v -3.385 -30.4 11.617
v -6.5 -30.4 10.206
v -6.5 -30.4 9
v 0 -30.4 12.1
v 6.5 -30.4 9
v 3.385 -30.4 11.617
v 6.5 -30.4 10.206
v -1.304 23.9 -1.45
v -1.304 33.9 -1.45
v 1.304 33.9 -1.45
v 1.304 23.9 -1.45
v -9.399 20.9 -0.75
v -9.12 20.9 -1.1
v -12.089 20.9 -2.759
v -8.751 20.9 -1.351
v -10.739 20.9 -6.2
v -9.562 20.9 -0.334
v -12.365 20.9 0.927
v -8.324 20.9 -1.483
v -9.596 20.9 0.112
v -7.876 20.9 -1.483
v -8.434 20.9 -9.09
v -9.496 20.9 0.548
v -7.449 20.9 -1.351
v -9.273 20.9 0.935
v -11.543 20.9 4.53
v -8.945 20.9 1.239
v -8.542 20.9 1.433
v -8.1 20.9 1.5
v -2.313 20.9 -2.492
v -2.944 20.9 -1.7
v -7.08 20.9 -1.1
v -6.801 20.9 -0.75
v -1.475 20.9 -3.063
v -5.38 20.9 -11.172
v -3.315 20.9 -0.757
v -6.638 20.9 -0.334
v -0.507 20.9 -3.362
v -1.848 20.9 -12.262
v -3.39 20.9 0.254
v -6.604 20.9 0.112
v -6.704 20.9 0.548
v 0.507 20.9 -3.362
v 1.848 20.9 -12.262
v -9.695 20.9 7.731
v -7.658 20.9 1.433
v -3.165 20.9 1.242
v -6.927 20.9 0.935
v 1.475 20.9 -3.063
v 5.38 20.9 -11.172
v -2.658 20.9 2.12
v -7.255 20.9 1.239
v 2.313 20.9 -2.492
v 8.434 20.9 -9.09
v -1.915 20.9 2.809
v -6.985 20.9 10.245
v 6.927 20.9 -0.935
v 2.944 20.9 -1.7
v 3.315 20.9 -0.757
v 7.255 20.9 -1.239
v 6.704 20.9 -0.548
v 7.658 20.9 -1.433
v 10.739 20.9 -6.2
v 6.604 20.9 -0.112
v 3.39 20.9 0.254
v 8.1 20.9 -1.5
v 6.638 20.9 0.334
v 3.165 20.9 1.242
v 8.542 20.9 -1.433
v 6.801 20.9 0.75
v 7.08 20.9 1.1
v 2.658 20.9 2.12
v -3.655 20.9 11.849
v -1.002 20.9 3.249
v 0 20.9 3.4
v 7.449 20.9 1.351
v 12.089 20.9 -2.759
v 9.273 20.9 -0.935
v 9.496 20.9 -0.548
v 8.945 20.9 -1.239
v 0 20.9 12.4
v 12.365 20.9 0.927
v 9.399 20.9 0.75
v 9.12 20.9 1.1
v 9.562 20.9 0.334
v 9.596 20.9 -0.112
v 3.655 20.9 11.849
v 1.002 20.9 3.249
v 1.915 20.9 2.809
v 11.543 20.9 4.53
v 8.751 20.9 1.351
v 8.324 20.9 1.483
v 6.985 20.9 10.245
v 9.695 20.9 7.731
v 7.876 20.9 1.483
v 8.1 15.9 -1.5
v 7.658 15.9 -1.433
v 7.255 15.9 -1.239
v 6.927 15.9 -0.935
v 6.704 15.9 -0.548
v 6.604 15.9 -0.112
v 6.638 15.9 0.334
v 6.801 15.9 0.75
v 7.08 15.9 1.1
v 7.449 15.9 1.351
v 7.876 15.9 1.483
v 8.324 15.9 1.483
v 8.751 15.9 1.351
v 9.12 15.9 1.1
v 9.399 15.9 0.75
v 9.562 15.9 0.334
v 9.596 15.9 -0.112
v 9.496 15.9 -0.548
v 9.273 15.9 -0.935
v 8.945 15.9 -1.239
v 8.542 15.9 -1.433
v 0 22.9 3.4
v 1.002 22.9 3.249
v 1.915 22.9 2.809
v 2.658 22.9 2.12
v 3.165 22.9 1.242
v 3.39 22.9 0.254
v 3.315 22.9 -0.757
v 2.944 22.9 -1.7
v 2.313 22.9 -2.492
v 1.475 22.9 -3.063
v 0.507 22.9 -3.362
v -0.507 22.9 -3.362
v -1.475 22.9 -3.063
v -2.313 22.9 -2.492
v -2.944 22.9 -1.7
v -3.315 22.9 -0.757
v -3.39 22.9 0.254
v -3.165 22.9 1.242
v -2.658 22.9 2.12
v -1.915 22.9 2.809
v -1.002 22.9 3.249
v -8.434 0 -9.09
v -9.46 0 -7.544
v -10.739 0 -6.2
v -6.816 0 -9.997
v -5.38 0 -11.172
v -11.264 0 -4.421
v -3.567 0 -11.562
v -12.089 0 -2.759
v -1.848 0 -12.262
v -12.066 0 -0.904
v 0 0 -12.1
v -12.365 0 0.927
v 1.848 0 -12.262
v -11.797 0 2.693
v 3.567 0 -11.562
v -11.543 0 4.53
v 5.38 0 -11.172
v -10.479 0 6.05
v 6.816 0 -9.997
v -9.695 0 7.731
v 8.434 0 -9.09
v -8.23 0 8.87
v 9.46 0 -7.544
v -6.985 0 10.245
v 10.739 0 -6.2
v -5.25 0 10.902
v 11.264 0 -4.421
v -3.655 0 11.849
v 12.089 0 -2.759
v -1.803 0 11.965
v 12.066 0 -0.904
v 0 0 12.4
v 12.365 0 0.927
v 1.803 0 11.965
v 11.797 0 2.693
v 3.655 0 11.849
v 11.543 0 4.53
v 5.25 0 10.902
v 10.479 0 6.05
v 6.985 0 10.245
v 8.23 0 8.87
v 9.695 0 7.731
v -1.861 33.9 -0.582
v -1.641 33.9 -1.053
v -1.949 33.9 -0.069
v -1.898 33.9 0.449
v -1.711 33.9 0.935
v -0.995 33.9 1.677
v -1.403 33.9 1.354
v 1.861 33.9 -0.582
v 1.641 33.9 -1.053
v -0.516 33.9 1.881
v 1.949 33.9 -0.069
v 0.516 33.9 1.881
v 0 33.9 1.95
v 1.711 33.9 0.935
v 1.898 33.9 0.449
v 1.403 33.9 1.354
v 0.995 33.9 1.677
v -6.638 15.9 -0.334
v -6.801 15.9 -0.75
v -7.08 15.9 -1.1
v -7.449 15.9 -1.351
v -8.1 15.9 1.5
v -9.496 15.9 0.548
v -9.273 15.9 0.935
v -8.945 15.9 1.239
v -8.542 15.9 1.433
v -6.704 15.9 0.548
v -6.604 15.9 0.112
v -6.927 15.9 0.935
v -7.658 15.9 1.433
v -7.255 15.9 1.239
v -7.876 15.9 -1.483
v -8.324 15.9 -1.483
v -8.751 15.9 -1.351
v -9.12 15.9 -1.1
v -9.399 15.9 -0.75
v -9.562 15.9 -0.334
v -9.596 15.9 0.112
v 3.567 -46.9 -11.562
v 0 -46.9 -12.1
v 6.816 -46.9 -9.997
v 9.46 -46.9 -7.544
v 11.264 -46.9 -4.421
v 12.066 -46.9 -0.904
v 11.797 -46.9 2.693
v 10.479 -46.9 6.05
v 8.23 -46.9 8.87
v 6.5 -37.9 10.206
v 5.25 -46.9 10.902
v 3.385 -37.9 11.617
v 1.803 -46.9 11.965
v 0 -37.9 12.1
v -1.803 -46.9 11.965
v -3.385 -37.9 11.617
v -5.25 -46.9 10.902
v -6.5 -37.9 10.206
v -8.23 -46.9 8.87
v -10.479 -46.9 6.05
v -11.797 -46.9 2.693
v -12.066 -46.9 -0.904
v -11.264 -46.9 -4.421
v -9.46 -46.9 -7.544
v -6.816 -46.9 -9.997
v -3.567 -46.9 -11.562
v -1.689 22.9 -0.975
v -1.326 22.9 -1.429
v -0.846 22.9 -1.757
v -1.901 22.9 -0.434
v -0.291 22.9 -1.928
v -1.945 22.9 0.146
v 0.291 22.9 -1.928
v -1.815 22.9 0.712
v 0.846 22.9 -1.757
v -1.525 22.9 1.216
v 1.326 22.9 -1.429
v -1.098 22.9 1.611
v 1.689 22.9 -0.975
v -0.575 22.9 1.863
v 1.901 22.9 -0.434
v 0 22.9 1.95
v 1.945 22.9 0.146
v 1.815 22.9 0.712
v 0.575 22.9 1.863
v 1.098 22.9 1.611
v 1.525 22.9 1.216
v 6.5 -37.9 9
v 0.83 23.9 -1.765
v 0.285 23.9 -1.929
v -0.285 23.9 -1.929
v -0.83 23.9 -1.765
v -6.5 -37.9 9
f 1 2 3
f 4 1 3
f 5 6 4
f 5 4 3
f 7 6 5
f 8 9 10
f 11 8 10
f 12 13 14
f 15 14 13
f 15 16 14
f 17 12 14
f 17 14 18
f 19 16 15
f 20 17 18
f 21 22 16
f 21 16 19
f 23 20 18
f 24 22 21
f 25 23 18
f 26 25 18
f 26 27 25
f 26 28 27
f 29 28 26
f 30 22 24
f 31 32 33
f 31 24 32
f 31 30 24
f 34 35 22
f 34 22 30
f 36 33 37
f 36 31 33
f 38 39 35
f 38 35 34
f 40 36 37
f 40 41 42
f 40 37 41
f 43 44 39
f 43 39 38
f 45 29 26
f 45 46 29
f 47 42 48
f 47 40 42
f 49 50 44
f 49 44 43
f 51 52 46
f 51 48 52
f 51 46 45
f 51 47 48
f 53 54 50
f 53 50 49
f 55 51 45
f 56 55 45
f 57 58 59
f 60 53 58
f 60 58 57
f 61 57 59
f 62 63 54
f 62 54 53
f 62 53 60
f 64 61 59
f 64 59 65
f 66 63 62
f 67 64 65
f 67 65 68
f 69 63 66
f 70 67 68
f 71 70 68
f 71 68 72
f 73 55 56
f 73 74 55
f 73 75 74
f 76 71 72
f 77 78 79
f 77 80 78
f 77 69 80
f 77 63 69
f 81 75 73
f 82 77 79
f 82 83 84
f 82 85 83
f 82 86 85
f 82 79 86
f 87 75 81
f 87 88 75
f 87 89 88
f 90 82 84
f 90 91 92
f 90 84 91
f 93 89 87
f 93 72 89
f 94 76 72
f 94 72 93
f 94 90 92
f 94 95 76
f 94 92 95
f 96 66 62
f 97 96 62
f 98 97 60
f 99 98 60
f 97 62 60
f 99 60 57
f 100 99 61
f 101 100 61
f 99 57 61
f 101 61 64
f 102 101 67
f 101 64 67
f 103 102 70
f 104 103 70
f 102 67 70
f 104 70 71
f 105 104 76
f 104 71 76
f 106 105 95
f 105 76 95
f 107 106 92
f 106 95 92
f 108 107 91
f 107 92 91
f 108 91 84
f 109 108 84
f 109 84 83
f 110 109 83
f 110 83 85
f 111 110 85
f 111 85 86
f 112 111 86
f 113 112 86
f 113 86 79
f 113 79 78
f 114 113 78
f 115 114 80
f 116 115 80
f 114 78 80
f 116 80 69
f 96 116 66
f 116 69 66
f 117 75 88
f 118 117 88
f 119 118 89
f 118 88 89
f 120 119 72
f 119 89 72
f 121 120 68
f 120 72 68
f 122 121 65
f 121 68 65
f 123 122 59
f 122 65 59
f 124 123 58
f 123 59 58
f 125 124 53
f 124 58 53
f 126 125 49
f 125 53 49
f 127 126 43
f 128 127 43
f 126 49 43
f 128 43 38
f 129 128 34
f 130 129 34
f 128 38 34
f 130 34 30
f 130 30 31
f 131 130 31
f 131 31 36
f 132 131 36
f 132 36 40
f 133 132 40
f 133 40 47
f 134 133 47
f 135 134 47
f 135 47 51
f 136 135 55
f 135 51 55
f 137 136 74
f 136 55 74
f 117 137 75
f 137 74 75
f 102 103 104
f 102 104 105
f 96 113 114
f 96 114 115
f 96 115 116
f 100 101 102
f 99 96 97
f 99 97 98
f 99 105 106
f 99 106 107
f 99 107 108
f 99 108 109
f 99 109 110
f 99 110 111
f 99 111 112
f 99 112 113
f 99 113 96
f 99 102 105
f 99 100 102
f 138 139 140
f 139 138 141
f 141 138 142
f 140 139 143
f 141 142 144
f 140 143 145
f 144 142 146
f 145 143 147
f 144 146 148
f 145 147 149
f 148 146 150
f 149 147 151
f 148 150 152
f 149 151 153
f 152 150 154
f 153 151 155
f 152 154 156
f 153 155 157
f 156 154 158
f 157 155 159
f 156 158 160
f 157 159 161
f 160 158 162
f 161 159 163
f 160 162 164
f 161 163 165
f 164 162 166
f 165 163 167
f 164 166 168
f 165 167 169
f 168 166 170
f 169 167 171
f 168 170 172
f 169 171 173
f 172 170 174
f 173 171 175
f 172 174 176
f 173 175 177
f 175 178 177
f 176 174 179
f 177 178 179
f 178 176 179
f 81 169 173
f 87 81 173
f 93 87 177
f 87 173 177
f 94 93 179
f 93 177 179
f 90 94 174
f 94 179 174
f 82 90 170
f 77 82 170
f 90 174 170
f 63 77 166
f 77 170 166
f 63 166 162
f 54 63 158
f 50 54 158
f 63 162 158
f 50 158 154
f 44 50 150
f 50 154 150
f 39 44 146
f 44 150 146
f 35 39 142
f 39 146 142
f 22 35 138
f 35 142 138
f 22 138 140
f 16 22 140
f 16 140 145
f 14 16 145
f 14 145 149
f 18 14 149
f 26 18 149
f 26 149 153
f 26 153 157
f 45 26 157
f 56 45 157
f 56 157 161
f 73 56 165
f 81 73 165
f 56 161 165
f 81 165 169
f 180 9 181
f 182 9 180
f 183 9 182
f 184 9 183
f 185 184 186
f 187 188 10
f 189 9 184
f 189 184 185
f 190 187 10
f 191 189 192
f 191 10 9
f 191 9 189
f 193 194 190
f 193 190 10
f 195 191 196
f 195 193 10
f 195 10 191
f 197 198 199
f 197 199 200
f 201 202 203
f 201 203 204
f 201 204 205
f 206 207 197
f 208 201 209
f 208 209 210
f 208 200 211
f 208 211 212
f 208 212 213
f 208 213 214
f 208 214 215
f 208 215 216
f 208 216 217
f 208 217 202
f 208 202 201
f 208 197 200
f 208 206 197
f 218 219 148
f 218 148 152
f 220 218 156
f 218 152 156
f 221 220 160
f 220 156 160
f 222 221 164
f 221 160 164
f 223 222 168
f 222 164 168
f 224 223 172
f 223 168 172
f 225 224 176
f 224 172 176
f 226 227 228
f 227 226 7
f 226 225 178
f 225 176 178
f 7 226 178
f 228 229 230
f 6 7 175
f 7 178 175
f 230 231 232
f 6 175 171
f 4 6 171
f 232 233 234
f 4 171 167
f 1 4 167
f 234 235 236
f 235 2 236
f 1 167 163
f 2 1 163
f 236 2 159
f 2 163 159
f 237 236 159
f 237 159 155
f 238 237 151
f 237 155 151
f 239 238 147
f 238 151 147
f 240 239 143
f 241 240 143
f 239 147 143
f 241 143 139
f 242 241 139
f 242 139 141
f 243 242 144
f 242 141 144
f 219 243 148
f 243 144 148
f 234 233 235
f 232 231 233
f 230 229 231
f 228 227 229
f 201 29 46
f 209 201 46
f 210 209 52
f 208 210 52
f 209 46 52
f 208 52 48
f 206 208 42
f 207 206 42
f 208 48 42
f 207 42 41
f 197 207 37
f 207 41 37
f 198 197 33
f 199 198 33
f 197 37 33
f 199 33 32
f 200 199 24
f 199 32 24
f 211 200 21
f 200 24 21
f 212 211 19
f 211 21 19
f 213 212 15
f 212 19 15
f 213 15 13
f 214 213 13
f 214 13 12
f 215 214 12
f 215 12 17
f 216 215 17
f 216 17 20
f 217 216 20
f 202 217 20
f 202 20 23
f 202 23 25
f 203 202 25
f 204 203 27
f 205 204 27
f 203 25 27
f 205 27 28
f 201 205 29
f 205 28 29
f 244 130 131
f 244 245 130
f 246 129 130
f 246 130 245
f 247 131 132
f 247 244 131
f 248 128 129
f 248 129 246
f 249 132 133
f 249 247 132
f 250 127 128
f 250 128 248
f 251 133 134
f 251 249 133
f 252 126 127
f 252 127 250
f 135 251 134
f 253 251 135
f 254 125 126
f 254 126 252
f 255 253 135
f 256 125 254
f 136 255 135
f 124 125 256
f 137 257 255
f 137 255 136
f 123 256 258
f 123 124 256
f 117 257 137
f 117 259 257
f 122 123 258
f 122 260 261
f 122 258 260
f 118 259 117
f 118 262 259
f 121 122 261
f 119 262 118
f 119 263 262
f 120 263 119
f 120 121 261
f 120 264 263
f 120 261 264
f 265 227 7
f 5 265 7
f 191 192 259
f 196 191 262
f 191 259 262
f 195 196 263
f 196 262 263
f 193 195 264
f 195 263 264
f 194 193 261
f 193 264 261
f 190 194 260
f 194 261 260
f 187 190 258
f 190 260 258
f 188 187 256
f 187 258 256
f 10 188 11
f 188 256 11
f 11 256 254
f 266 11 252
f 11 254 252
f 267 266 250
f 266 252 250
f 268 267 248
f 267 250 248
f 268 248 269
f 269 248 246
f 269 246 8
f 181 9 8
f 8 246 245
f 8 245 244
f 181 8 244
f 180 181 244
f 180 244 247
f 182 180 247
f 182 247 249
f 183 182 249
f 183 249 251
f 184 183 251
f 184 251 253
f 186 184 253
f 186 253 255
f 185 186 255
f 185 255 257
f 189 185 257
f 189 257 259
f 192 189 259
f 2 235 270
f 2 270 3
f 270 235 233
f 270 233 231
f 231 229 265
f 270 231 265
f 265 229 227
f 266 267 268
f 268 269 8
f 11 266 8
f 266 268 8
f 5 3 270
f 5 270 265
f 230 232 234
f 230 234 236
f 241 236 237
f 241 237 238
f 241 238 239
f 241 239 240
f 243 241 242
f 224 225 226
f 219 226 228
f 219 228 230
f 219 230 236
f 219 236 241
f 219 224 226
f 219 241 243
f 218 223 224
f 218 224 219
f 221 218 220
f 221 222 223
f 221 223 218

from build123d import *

# Parameters (mm, degrees)
SKETCH1_R           = 12.4
BOSS_EXTRUDE1_DEPTH = 20.9
SKETCH4_R           = 3.4
BOSS_EXTRUDE3_DEPTH = 2
SKETCH6_R           = 1.95
BOSS_EXTRUDE4_DEPTH = 11
CUT_EXTRUDE1_DEPTH  = 10
SKETCH8_R           = 12.1
BOSS_EXTRUDE5_DEPTH = 46.9
SKETCH9_R           = 1.5
CUT_EXTRUDE2_DEPTH  = 5
SKETCH10_W          = 13
SKETCH10_H          = 7.5
CUT_EXTRUDE3_DEPTH  = 4


with BuildPart() as part:
    # Sketch1 → Boss-Extrude1 (new body)
    with BuildSketch(Plane(origin=(0, 0, 0), x_dir=(1, 0, 0), z_dir=(0, 1, 0))):
        with Locations(Location((0, 0, 0), (0, 0, 270))):
            Circle(SKETCH1_R)
    extrude(amount=BOSS_EXTRUDE1_DEPTH)

    # Sketch4 → Boss-Extrude3 (add)
    with BuildSketch(Plane(origin=(0, 20.9, 0), x_dir=(1, 0, 0), z_dir=(0, 1, 0))):
        with Locations(Location((0, 0, 0), (0, 0, 270))):
            Circle(SKETCH4_R)
    extrude(amount=BOSS_EXTRUDE3_DEPTH)

    # Sketch6 → Boss-Extrude4 (add)
    with BuildSketch(Plane(origin=(0, 22.9, 0), x_dir=(1, 0, 0), z_dir=(0, 1, 0))):
        with Locations(Location((0, 0, 0), (0, 0, 270))):
            Circle(SKETCH6_R)
    extrude(amount=BOSS_EXTRUDE4_DEPTH)

    # Sketch7 → Cut-Extrude1 (cut)
    with BuildSketch(Plane(origin=(0, 33.9, 0), x_dir=(1, 0, 0), z_dir=(0, 1, 0))):
        Polygon((0, 1.45), (-1.840503263, 1.45), (-1.840503263, 3.329277937), (1.844863843, 3.329277937), (1.844863843, 1.45), align=None)
    extrude(amount=-CUT_EXTRUDE1_DEPTH, mode=Mode.SUBTRACT)

    # Sketch8 → Boss-Extrude5 (add)
    with BuildSketch(Plane.XZ):
        with Locations(Location((0, 0, 0), (0, 0, 270))):
            Circle(SKETCH8_R)
    extrude(amount=BOSS_EXTRUDE5_DEPTH)

    # Sketch9 → Cut-Extrude2 (cut)
    with BuildSketch(Plane(origin=(0, 20.9, 0), x_dir=(1, 0, 0), z_dir=(0, 1, 0))):
        with Locations(Location((-8.1, 0, 0), (0, 0, 270))):
            Circle(SKETCH9_R)
        with Locations(Location((8.1, 0, 0), (0, 0, 90))):
            Circle(SKETCH9_R)
    extrude(amount=-CUT_EXTRUDE2_DEPTH, mode=Mode.SUBTRACT)

    # Sketch10 → Cut-Extrude3 (cut)
    with BuildSketch(Plane.XY.offset(13)):
        with Locations((0, -34.15)):
            Rectangle(SKETCH10_W, SKETCH10_H)
    extrude(amount=-CUT_EXTRUDE3_DEPTH, mode=Mode.SUBTRACT)


solid = part.part
